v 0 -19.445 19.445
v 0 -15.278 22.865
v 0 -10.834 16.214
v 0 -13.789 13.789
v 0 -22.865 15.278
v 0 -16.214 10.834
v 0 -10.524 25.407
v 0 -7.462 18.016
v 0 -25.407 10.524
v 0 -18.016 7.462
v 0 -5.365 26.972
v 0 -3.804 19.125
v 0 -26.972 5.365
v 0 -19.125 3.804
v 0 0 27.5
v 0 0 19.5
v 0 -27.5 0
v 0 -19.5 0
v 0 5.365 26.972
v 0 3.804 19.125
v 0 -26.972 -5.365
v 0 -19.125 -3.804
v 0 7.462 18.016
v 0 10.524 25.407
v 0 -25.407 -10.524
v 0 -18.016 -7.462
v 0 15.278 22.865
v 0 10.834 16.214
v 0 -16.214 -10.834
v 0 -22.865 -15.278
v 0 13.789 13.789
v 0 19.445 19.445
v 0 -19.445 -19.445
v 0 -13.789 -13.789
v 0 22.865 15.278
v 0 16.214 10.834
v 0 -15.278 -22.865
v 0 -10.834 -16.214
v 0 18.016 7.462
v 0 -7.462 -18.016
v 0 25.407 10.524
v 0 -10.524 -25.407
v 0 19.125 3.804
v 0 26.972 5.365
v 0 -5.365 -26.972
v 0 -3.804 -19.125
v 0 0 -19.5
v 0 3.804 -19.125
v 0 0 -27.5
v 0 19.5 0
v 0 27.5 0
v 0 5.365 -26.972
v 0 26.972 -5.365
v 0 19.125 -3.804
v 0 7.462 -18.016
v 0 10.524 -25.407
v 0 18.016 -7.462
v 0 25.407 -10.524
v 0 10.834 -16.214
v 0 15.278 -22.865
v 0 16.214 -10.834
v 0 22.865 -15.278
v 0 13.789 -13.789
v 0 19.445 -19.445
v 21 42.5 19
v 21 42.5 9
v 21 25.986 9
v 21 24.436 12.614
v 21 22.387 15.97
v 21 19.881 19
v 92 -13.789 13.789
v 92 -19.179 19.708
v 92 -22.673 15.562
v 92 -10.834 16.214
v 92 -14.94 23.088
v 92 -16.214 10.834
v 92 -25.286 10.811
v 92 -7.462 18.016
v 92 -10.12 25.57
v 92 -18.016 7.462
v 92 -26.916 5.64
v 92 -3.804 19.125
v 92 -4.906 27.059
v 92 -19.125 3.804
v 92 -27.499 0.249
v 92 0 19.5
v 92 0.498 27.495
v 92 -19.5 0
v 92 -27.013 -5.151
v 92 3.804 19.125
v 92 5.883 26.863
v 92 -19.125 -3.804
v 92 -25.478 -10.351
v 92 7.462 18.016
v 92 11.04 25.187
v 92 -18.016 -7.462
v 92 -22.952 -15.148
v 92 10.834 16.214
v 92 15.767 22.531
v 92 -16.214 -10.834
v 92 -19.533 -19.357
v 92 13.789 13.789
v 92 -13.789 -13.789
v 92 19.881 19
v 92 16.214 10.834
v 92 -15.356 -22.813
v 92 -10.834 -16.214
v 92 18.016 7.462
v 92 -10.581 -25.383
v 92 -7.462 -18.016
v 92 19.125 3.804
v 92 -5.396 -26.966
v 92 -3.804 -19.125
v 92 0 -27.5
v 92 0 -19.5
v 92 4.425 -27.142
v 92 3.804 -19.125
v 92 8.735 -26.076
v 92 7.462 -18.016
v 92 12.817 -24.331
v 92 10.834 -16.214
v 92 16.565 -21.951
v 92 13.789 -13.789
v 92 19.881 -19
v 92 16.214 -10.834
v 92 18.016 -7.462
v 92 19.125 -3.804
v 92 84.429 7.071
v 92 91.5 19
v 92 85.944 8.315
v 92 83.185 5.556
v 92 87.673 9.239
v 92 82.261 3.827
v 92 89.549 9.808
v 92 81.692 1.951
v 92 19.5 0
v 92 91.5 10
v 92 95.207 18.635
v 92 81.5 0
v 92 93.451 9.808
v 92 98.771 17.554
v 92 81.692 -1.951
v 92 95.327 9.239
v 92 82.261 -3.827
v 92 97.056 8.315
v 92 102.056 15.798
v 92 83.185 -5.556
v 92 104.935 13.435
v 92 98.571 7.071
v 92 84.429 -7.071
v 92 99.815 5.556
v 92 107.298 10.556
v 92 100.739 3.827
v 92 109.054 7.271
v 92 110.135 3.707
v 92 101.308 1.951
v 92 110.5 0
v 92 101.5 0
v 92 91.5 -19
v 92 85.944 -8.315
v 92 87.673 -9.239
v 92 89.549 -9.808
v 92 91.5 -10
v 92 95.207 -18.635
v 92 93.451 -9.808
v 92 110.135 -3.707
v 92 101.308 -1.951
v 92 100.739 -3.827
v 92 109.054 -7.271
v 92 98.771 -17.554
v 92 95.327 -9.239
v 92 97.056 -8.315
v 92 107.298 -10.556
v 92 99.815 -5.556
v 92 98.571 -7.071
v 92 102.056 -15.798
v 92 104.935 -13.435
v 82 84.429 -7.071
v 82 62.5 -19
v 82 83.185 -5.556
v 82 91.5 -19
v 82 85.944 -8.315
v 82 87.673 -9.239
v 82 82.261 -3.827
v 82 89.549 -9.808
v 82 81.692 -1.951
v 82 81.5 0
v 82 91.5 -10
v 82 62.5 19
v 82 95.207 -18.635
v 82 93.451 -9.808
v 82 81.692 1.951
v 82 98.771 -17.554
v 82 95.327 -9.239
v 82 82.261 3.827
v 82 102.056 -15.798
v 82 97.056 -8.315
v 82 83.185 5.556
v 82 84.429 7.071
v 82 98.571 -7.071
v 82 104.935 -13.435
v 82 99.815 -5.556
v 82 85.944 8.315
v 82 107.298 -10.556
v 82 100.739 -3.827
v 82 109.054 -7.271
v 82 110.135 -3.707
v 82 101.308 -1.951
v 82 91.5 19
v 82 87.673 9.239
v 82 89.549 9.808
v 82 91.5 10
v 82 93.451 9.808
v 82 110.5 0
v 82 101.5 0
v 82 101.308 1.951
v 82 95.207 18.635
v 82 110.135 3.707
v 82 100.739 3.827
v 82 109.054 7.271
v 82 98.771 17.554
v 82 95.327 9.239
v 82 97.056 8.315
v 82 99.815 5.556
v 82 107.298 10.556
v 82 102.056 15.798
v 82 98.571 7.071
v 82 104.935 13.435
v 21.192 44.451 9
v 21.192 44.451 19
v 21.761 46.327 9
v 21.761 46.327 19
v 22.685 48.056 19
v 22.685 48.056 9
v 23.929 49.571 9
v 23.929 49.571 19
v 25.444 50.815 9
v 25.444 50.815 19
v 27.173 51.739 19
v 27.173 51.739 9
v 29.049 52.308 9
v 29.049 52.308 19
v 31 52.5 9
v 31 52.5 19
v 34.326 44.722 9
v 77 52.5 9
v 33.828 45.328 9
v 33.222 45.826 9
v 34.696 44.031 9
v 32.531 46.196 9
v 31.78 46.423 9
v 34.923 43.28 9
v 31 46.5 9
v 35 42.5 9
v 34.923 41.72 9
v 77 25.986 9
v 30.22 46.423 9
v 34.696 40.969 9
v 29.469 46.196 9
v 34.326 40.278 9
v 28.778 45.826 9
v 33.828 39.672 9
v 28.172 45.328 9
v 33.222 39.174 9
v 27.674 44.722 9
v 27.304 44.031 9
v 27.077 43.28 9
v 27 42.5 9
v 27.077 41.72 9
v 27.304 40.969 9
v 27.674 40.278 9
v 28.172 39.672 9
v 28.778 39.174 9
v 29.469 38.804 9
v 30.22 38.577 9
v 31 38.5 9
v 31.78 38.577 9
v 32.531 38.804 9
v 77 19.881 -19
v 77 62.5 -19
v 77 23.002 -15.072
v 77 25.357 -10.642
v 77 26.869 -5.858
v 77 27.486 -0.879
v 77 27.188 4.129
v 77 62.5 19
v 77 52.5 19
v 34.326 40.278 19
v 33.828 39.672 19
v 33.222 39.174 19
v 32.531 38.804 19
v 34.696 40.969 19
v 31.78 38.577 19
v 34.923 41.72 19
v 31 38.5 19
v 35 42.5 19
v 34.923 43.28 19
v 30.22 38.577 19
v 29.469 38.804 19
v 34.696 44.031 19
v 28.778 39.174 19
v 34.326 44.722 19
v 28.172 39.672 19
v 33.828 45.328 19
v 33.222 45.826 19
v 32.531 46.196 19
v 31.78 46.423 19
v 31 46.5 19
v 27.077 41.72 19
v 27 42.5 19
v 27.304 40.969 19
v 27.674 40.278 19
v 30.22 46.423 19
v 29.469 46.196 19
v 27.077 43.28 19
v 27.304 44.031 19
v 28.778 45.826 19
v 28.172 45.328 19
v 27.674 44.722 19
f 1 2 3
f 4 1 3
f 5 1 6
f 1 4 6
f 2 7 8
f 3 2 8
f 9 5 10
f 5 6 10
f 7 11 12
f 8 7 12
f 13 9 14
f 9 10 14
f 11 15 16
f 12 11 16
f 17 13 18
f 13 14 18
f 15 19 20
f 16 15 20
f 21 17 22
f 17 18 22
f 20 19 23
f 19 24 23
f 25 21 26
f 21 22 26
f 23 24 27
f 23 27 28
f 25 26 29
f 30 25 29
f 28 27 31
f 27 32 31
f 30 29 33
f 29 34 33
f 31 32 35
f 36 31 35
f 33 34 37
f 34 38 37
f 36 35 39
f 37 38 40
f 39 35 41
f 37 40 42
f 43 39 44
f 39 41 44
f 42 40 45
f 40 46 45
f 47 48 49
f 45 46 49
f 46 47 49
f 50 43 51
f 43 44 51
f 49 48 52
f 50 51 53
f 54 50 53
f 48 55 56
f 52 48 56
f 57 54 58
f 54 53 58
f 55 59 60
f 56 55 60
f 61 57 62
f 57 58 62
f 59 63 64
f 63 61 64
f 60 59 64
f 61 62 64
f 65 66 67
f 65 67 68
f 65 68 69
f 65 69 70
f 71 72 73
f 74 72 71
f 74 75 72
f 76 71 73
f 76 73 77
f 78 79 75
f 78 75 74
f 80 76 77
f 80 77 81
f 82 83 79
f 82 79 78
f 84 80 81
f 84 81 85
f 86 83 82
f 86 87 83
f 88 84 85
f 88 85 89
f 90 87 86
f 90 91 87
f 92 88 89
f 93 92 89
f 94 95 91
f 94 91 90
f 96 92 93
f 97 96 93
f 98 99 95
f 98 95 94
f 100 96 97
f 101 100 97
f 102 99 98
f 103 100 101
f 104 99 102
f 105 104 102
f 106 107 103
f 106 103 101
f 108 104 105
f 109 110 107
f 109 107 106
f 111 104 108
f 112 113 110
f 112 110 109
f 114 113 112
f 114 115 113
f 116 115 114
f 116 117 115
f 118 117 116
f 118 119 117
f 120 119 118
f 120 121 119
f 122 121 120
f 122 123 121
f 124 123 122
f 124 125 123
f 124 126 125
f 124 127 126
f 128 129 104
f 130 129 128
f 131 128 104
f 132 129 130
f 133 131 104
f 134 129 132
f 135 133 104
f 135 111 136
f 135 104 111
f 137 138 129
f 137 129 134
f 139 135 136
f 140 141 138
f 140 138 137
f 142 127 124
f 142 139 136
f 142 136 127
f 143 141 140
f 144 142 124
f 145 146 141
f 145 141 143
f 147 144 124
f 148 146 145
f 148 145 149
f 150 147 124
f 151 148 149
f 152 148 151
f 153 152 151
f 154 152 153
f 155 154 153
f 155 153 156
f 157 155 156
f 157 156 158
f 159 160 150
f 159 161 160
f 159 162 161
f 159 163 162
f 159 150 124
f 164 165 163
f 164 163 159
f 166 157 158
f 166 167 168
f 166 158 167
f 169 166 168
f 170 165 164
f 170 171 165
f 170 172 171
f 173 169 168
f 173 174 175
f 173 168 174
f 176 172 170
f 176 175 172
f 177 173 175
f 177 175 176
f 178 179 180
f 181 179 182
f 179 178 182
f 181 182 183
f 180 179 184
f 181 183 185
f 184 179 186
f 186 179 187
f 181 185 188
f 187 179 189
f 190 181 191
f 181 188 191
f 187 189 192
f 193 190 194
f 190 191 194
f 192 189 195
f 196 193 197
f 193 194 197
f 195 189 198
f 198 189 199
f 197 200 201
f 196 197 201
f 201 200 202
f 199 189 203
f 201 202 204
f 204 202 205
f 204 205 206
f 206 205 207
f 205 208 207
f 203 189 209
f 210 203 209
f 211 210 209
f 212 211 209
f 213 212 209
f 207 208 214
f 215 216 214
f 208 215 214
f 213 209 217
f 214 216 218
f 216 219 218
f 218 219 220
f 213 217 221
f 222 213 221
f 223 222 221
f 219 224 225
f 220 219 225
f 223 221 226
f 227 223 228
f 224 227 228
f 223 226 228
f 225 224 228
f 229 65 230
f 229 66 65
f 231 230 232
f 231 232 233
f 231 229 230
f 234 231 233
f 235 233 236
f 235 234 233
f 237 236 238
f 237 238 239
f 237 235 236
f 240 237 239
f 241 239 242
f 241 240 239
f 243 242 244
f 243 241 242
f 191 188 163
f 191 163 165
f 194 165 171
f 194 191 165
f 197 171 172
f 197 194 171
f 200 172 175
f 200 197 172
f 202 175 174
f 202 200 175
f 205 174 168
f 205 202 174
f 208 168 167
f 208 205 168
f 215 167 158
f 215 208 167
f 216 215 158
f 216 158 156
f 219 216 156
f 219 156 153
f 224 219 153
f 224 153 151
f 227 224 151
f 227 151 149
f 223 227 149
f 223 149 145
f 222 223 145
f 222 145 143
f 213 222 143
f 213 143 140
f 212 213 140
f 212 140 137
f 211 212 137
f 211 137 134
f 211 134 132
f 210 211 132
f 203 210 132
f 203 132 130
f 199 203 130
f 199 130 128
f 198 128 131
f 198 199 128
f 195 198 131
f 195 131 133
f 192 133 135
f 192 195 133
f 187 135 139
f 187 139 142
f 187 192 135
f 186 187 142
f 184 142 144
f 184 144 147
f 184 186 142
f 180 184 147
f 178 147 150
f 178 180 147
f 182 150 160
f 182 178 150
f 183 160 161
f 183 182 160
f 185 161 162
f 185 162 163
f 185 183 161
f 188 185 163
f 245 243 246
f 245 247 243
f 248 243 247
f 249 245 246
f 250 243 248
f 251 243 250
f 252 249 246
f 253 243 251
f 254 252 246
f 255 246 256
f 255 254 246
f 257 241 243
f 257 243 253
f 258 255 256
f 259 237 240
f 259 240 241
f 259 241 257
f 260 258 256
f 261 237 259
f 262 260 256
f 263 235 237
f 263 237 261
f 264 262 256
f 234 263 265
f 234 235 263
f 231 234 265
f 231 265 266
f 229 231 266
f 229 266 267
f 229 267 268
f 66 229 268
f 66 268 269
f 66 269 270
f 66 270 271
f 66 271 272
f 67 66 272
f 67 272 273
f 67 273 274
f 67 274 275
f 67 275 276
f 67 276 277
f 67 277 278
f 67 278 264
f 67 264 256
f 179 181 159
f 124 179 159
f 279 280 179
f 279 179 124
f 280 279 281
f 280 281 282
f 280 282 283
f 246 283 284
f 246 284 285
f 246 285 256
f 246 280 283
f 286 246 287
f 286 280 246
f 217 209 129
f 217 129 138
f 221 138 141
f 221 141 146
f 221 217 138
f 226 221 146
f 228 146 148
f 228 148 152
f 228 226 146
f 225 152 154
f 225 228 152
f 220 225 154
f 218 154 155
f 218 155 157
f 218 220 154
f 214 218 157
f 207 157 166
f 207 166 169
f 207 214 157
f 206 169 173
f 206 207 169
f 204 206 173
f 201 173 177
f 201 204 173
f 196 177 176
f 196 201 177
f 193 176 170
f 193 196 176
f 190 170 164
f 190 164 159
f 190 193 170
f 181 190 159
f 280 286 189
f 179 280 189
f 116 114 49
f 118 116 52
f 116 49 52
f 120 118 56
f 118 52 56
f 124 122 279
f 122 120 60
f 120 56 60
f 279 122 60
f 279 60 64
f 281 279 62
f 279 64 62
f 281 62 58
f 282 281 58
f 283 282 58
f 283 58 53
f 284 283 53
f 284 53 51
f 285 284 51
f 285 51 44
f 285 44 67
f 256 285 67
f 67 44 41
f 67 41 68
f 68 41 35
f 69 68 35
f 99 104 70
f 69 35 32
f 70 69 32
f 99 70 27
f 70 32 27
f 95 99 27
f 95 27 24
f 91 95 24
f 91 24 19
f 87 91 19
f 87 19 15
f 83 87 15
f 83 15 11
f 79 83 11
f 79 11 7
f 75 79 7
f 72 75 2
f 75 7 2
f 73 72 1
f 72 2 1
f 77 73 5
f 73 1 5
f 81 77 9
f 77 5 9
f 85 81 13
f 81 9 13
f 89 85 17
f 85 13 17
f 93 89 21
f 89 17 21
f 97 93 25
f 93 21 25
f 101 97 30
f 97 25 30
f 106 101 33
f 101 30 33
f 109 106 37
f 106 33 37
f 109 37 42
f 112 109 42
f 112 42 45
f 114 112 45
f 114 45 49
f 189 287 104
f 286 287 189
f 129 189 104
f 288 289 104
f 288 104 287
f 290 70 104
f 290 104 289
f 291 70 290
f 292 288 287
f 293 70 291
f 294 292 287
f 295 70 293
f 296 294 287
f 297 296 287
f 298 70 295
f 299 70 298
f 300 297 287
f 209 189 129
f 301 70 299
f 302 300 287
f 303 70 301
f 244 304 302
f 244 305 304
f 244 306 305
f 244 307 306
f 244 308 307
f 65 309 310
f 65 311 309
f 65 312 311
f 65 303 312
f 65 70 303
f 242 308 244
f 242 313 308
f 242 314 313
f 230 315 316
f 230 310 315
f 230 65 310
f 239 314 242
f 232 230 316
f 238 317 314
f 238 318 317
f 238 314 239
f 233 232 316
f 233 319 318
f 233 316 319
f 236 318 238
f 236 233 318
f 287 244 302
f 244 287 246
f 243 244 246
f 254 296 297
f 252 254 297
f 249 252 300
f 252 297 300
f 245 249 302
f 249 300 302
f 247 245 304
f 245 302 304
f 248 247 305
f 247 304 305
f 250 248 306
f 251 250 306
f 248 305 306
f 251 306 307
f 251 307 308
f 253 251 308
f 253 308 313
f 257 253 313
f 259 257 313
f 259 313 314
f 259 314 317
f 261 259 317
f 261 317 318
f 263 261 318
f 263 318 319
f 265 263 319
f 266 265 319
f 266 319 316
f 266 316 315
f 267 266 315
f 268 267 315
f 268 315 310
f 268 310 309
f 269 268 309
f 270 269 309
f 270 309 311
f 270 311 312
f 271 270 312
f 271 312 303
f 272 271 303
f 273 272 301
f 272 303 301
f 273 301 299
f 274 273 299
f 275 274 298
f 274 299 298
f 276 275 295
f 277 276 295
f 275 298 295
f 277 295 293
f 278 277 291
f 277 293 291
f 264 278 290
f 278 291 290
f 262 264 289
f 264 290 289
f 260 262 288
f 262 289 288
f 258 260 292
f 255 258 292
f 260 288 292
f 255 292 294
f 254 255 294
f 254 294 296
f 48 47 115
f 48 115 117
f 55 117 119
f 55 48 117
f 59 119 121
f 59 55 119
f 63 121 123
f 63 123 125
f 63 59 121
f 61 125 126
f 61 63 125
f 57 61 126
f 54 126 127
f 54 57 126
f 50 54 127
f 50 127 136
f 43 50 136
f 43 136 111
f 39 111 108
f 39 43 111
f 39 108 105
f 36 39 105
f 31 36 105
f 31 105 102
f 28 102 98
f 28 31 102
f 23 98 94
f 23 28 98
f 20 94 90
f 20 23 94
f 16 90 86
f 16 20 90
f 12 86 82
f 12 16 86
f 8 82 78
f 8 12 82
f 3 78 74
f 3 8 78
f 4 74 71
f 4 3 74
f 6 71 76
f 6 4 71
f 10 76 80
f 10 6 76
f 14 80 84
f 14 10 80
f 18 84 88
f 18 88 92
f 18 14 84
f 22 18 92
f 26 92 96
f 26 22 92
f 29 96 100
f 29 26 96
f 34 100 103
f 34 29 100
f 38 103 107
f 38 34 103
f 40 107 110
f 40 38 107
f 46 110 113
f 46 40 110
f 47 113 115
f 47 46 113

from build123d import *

# Parameters (mm, degrees)
SKETCH_1_R          = 27.5
SKETCH_1_R_2        = 19.5
EXTRUDE_1_DEPTH     = 92
EXTRUDE_START       = -15
SKETCH_2_R          = 10
EXTRUDE_2_DEPTH     = 15
CUT_EXTRUDE_1_REACH = 153.118
SKETCH_3_W          = 5
SKETCH_3_H          = 48
EXTRUDE_START_2     = 56
EXTRUDE_3_DEPTH     = 56
FILLET_1_R          = 10
CUT_EXTRUDE_2_REACH = 153.118
SKETCH_7_R          = 4


with BuildPart() as part:
    # 草图1 → 凸台-拉伸1 (new body)
    with BuildSketch(Plane(origin=(0, 0, 0), x_dir=(0, 0, -1), z_dir=(1, 0, 0))):
        Circle(SKETCH_1_R)
        Circle(SKETCH_1_R_2, mode=Mode.SUBTRACT)
    extrude(amount=EXTRUDE_1_DEPTH)

    # 草图2 → 凸台-拉伸2 (add)
    with BuildSketch(Plane(origin=(92, 0, 0), x_dir=(0, 0, -1), z_dir=(1, 0, 0)).offset(EXTRUDE_START)):
        with BuildLine():
            Line((-19, 19.880895352), (-19, 91.5))
            ThreePointArc((-19, 91.5), (0, 110.5), (19, 91.5))
            Line((19, 91.5), (19, 19.880895352))
            ThreePointArc((19, 19.880895352), (0, 27.5), (-19, 19.880895352))
        make_face()
        with Locations((0, 91.5)):
            Circle(SKETCH_2_R, mode=Mode.SUBTRACT)
    extrude(amount=EXTRUDE_2_DEPTH)

    # 草图3 → 切除-拉伸1 (cut, up to next)
    with BuildSketch(Plane.XY.offset(19), mode=Mode.PRIVATE) as cut_extrude_1_sk1:
        with Locations((79.5, 86.5)):
            Rectangle(SKETCH_3_W, SKETCH_3_H)
    cut_extrude_1_tool1 = extrude(cut_extrude_1_sk1.sketch, amount=-CUT_EXTRUDE_1_REACH, mode=Mode.PRIVATE) & part.part
    add(cut_extrude_1_tool1.solids().sort_by_distance((79.5, 86.5, 19))[0], mode=Mode.SUBTRACT)

    # 草图6 → 凸台-拉伸3 (add)
    with BuildSketch(Plane.ZY.offset(-77).offset(EXTRUDE_START_2)):
        with BuildLine():
            Line((19, 19.880895352), (19, 52.5))
            Line((19, 52.5), (9, 52.5))
            Line((9, 52.5), (9, 25.98557292))
            ThreePointArc((9, 25.98557292), (14.328878953, 23.471966853), (19, 19.880895352))
        make_face()
    extrude(amount=-EXTRUDE_3_DEPTH)

    # 圆角1
    fillet_1_edges = [part.edges().sort_by_distance(p)[0] for p in [
        (21, 52.5, 14),
    ]]
    fillet(fillet_1_edges, radius=FILLET_1_R)

    # 草图7 → 切除-拉伸2 (cut, up to next)
    with BuildSketch(Plane.XY.offset(19), mode=Mode.PRIVATE) as cut_extrude_2_sk1:
        with Locations((31, 42.5)):
            Circle(SKETCH_7_R)
    cut_extrude_2_tool1 = extrude(cut_extrude_2_sk1.sketch, amount=-CUT_EXTRUDE_2_REACH, mode=Mode.PRIVATE) & part.part
    add(cut_extrude_2_tool1.solids().sort_by_distance((31, 42.5, 19))[0], mode=Mode.SUBTRACT)


solid = part.part
